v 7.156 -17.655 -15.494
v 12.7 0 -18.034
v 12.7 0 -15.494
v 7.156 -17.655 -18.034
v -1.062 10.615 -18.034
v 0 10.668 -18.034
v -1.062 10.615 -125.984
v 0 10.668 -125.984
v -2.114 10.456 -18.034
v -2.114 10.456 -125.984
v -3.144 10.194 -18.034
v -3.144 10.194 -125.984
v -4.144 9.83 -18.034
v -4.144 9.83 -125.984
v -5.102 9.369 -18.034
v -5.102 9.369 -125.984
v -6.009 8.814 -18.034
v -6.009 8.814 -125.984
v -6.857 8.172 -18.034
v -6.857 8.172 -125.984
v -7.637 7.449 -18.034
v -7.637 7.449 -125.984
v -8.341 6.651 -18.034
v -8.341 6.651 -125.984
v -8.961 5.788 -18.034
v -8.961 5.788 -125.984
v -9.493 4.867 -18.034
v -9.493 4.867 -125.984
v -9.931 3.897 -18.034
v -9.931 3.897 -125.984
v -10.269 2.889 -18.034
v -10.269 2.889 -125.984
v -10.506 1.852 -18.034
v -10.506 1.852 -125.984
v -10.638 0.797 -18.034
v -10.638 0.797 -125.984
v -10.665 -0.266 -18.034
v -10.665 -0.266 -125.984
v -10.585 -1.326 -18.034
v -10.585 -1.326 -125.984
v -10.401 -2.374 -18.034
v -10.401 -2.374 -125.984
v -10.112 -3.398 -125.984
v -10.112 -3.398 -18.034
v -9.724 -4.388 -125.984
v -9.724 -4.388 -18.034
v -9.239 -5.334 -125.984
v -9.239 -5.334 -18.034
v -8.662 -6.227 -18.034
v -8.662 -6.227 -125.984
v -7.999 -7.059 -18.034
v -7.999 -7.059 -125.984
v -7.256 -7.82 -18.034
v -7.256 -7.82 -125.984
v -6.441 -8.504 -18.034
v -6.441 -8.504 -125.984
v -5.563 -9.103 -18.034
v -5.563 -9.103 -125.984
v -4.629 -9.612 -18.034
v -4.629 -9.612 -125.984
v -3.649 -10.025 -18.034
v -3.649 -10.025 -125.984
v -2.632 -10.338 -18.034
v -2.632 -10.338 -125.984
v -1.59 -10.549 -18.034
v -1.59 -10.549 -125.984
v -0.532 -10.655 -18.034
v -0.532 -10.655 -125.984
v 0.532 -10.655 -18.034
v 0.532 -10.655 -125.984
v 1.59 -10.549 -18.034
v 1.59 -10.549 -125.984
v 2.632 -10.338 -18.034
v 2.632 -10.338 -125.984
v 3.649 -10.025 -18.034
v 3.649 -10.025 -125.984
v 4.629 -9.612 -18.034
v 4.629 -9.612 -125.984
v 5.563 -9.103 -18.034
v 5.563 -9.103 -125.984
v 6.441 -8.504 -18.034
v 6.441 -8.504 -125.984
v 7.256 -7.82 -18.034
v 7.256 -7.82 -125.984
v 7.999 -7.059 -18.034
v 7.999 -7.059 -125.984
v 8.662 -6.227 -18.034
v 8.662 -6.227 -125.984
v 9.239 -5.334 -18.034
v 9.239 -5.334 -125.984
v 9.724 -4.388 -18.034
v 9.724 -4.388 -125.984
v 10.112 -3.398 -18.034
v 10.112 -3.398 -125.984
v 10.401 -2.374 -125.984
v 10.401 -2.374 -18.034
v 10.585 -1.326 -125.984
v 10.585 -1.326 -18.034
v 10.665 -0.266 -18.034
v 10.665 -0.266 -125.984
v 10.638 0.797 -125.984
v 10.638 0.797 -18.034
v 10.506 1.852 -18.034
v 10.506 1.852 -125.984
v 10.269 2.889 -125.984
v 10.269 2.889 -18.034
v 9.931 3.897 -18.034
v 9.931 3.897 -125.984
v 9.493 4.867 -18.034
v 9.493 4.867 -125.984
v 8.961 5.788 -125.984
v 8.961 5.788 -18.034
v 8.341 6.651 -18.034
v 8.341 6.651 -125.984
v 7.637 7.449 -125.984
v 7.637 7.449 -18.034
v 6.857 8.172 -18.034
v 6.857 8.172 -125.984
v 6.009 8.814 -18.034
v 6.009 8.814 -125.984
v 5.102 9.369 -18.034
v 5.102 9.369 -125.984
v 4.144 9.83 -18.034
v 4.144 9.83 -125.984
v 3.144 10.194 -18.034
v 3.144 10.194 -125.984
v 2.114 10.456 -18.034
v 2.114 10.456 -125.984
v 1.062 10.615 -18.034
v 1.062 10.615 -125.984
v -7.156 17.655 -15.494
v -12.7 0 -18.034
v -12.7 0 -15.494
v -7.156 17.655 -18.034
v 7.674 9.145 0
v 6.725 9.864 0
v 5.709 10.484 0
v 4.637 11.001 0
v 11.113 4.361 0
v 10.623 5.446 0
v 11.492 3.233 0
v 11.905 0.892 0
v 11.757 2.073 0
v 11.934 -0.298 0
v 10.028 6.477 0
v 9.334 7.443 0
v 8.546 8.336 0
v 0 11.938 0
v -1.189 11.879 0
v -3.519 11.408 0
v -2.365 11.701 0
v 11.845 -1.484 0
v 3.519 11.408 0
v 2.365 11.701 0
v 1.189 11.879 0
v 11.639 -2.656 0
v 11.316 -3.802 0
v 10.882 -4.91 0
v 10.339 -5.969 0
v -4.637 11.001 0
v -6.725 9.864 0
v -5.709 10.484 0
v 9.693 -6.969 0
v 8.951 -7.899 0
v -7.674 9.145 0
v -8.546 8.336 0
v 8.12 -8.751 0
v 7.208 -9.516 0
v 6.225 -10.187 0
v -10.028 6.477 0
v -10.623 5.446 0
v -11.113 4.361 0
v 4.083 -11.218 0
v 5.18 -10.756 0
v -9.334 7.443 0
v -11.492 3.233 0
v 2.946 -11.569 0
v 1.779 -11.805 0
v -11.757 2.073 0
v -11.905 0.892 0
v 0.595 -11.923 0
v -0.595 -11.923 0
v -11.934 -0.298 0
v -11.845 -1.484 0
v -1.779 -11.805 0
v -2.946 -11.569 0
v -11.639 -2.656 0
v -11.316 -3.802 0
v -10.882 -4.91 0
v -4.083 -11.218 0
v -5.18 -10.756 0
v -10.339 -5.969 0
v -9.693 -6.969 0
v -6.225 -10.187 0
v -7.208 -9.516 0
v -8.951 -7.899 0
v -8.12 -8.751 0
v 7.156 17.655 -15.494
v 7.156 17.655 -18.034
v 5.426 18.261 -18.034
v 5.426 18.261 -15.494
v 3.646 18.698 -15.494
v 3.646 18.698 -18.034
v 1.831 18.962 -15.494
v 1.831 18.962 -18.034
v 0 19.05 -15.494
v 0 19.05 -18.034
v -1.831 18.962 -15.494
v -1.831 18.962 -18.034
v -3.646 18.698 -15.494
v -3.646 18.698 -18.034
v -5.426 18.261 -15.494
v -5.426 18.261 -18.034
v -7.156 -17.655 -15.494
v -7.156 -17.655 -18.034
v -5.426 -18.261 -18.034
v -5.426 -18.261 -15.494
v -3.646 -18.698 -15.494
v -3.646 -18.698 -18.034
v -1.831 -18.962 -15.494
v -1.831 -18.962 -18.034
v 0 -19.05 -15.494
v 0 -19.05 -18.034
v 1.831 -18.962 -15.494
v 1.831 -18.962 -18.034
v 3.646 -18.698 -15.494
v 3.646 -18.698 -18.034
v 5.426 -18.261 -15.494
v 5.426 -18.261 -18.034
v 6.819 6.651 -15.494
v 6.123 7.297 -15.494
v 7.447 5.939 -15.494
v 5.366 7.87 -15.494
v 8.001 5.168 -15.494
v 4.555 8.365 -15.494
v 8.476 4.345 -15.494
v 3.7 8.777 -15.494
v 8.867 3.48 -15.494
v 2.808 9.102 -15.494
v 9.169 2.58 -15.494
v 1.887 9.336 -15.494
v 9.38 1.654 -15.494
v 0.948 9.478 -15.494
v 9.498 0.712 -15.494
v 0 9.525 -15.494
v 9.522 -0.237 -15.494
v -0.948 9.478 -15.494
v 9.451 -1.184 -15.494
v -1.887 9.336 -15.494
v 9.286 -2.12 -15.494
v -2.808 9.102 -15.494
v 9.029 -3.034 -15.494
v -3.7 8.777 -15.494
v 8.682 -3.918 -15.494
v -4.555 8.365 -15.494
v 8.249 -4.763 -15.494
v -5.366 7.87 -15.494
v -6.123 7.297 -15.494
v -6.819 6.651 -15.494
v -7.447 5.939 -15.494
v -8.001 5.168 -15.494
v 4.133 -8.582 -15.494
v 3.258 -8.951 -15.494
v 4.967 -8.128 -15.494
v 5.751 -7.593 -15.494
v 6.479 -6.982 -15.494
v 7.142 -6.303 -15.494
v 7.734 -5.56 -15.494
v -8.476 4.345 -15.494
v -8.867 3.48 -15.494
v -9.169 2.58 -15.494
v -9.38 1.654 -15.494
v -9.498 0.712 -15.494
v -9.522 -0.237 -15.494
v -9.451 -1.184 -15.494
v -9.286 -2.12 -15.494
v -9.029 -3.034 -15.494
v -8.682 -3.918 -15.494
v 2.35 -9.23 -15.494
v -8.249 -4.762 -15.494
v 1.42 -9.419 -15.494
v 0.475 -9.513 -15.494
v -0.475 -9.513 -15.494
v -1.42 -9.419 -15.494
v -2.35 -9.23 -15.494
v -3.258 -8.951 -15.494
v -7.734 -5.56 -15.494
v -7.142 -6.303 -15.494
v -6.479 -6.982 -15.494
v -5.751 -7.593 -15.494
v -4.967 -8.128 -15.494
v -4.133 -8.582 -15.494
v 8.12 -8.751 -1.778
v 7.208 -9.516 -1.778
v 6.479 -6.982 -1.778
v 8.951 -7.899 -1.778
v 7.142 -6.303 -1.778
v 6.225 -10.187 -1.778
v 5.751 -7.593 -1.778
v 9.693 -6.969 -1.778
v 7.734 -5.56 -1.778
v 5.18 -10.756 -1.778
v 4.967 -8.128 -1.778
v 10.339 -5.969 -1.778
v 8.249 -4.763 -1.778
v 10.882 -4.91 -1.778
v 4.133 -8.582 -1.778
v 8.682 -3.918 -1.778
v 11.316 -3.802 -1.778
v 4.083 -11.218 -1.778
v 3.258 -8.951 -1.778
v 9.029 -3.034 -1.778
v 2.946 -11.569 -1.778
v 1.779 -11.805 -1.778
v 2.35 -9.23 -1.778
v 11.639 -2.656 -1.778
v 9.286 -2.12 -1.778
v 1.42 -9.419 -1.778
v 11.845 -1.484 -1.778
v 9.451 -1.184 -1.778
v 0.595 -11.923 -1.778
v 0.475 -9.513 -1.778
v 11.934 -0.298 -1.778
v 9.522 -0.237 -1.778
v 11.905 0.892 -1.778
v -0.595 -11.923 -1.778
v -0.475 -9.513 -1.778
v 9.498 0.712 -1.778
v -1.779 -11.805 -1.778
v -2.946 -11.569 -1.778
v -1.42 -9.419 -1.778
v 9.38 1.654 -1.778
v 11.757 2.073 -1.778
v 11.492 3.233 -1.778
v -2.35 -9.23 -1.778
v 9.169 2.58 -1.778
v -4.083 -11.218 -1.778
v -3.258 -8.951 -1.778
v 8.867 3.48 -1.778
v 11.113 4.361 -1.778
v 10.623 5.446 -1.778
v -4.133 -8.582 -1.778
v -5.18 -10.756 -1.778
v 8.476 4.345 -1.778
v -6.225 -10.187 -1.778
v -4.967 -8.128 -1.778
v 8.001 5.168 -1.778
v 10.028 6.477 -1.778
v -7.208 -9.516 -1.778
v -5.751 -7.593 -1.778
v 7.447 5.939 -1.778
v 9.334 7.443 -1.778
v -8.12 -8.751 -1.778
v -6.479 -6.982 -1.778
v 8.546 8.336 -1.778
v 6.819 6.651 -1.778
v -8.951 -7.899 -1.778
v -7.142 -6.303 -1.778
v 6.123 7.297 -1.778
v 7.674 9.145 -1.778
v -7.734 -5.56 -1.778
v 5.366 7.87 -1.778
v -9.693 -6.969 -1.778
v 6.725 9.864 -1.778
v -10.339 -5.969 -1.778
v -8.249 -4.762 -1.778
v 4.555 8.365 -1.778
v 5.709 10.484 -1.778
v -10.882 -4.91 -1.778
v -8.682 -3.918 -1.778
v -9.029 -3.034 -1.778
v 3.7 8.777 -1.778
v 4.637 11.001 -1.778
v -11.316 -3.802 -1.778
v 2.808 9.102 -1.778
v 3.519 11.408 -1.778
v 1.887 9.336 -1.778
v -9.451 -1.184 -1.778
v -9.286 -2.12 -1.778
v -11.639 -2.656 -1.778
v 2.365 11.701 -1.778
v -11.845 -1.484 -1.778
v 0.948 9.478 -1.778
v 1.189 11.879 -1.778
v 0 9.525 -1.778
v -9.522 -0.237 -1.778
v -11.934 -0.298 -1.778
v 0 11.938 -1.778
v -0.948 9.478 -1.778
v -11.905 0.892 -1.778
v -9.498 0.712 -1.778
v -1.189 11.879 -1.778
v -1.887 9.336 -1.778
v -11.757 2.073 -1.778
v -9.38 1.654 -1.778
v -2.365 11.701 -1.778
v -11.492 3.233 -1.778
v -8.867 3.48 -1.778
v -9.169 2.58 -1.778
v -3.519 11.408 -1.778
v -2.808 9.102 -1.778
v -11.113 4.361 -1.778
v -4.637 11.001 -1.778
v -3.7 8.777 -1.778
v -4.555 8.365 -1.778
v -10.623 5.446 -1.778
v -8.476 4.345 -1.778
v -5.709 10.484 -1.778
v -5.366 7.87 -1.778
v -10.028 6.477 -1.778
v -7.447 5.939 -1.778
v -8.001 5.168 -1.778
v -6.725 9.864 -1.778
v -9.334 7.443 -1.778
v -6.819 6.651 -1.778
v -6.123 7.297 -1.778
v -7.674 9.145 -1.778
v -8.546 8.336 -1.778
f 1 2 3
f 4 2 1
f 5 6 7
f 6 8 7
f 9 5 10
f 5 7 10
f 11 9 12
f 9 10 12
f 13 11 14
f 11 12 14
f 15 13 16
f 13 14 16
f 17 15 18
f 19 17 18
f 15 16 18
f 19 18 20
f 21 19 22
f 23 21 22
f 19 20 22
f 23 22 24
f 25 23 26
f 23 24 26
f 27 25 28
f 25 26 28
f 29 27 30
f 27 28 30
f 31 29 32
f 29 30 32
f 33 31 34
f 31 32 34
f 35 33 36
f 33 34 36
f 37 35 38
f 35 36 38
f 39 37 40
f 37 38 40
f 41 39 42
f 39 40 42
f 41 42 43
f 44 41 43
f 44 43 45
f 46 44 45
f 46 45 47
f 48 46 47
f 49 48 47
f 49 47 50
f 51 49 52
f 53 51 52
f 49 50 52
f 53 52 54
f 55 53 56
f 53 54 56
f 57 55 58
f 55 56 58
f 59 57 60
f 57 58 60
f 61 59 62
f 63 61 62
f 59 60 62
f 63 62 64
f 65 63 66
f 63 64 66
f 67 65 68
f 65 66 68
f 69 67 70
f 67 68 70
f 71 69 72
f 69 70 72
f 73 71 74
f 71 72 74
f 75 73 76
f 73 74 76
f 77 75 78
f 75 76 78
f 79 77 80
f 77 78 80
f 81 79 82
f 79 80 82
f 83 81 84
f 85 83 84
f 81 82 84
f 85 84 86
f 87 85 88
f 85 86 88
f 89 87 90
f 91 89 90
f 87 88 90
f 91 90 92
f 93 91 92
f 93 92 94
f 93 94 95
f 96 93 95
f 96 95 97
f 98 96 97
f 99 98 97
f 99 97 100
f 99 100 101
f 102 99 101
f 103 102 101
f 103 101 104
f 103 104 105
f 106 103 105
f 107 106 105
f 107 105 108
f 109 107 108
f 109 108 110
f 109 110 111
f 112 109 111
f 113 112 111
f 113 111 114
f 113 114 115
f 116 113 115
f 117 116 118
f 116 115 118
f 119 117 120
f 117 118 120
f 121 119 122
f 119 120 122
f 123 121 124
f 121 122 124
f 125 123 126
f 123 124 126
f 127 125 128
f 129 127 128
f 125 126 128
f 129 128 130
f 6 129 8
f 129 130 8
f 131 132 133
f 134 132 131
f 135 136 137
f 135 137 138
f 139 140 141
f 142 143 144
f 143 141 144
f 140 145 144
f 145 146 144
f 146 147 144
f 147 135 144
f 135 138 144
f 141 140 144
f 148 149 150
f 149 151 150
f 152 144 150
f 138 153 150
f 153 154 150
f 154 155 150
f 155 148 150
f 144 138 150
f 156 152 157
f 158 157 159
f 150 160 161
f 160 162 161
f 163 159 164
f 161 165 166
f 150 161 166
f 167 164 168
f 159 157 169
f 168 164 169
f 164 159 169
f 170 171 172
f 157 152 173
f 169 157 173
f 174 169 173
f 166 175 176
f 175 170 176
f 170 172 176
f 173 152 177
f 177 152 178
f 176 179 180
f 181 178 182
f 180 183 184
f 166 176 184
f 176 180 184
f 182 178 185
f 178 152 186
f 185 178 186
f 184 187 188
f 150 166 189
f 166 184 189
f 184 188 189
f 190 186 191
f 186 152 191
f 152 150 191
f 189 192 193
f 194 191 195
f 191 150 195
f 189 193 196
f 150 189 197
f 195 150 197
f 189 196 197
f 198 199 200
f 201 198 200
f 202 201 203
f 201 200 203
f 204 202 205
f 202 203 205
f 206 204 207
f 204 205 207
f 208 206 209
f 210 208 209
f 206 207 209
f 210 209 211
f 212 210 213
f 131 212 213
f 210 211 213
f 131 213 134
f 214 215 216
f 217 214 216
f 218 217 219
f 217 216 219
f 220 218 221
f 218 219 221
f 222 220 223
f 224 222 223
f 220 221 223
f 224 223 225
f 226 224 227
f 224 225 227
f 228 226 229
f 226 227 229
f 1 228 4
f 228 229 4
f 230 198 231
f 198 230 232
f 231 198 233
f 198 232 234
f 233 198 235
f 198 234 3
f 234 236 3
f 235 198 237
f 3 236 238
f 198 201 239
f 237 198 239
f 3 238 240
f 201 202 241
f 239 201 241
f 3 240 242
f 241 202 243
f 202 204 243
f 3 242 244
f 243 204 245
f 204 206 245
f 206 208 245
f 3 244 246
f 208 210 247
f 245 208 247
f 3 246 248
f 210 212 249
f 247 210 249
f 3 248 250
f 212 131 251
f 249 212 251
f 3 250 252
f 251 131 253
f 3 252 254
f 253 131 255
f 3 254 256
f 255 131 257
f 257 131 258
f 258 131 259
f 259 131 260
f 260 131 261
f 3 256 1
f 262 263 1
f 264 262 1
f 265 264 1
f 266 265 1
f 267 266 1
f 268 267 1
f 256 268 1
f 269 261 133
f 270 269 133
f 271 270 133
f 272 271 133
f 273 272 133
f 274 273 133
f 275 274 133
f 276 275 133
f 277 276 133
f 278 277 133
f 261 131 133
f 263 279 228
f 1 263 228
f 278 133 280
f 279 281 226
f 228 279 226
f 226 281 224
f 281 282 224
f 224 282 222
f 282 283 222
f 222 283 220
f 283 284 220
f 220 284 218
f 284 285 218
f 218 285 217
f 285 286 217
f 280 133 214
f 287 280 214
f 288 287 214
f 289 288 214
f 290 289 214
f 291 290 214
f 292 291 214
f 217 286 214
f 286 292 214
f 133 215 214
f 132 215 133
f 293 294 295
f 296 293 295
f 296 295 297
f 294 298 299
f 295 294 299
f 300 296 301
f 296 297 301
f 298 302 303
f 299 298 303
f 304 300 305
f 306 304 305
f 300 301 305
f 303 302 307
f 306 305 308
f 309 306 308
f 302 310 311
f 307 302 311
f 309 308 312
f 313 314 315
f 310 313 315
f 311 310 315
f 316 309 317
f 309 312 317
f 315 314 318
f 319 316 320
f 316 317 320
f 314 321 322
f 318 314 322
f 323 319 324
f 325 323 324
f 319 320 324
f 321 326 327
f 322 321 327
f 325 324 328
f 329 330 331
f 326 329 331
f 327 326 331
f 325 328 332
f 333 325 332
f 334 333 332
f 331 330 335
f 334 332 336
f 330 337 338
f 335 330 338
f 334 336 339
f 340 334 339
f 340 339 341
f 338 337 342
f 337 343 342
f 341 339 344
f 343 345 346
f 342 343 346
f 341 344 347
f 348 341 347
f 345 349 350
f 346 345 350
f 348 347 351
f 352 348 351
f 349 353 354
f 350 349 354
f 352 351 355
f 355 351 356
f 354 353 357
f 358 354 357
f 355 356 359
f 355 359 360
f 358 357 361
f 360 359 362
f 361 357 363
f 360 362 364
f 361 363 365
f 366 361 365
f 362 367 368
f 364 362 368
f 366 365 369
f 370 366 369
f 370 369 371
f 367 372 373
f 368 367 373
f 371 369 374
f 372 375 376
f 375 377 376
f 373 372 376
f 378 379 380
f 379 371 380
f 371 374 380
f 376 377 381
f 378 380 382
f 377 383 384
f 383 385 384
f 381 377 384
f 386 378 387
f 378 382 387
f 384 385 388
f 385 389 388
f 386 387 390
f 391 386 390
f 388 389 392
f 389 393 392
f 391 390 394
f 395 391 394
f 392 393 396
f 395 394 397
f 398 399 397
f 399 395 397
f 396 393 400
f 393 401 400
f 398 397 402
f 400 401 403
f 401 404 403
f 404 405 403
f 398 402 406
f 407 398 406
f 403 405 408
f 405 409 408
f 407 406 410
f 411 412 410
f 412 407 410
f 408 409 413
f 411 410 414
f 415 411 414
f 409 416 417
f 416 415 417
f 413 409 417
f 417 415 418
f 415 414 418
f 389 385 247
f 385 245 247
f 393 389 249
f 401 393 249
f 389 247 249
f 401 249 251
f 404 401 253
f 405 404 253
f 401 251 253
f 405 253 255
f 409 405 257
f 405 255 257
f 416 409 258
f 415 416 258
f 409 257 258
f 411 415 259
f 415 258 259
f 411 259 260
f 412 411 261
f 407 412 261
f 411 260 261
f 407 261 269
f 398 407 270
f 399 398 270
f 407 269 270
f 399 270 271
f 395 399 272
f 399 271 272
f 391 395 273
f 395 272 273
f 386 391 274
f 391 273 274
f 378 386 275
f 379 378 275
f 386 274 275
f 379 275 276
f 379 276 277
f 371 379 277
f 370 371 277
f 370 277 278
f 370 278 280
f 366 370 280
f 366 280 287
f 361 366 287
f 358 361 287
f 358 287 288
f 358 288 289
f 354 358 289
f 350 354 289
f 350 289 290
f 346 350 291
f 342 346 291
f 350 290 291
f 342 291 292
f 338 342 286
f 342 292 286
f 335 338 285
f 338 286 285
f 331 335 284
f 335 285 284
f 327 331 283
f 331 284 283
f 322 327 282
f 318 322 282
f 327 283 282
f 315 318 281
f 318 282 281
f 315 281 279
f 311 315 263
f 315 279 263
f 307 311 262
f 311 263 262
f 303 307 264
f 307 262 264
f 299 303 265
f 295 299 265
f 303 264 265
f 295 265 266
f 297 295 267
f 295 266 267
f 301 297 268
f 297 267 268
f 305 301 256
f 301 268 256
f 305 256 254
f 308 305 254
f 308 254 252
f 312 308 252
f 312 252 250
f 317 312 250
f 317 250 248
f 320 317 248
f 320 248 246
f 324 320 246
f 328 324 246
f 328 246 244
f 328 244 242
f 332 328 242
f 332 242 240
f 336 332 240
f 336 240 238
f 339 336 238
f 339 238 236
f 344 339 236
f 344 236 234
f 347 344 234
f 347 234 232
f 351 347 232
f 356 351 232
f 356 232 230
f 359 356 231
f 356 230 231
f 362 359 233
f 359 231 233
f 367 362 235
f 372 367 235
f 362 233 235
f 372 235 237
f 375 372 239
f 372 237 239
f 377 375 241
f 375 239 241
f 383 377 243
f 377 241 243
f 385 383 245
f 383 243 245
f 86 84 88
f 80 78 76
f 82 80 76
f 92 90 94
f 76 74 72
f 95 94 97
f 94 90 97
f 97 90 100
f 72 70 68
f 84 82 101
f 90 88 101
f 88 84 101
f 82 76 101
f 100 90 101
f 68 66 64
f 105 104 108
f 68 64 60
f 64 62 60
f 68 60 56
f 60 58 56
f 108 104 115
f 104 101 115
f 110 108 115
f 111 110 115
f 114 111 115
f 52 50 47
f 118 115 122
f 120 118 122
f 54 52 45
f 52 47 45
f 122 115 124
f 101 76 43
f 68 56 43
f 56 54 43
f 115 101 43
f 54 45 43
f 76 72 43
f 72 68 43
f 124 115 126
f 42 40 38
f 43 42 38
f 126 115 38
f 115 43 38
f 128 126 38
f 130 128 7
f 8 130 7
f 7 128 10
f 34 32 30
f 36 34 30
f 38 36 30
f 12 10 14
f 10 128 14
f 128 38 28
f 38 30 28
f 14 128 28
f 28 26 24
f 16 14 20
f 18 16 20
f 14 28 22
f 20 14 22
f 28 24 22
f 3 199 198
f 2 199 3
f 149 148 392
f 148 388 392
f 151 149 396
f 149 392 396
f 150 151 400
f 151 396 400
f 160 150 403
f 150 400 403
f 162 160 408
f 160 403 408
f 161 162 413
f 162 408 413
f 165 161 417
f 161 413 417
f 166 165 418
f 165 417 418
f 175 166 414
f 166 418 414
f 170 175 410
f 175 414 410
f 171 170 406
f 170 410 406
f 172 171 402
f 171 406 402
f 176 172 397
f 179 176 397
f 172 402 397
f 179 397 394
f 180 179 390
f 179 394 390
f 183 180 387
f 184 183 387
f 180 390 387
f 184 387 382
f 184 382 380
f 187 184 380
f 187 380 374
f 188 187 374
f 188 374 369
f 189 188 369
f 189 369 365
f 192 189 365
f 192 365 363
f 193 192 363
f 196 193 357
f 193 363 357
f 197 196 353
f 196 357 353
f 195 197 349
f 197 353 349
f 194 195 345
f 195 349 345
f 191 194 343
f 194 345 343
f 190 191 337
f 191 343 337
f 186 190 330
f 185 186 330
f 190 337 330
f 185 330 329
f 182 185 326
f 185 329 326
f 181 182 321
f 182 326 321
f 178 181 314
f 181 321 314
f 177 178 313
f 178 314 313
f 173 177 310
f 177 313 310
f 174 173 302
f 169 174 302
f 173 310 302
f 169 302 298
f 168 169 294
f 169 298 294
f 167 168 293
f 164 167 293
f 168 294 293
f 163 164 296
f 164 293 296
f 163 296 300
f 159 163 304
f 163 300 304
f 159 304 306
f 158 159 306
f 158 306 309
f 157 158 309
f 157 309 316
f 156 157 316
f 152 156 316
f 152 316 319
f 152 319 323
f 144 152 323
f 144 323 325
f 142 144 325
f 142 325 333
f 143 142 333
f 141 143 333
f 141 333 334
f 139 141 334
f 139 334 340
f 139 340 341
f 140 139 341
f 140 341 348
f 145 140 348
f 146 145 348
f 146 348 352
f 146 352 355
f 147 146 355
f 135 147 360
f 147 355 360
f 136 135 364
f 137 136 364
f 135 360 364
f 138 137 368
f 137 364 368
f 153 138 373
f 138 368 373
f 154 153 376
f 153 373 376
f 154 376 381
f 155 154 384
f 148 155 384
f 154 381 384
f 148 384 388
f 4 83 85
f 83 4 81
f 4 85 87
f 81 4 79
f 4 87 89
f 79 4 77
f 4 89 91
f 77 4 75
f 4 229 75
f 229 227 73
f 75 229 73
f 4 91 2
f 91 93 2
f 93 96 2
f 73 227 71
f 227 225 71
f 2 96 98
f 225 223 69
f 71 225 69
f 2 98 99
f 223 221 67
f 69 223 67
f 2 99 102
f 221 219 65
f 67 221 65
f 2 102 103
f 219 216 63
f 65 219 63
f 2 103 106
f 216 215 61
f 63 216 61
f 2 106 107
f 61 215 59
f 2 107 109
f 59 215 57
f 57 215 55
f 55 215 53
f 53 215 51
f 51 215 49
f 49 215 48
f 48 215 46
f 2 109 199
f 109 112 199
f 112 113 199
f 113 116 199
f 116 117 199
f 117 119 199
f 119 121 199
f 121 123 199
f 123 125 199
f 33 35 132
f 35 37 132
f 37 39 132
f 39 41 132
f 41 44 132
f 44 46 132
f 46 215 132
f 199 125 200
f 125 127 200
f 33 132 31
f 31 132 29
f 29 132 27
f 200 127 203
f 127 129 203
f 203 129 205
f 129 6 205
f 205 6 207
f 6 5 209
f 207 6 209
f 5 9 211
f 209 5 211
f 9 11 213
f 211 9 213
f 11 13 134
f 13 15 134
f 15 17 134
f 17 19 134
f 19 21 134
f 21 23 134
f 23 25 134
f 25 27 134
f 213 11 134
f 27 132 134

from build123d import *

# Parameters (mm, degrees)
CORTAR_EXTRUIR1_START = -2.54
CORTAR_EXTRUIR1_DEPTH = 2.54


# Read off the part's stored shape, not the designer's step: Cortar-Extruir1
with BuildPart() as part:
    # Croquis1 → Revolución1 (revolve)
    with BuildSketch(Plane(origin=(0, 0, 0), x_dir=(0, 0, -1), z_dir=(1, 0, 0))):
        Polygon((0, 0), (0, 11.938), (1.778, 11.938), (1.778, 9.525), (15.494, 9.525), (15.494, 19.05), (18.034, 19.05), (18.034, 10.668), (125.984, 10.668), (125.984, 0), align=None)
    revolve(axis=Axis((0, 0, -125.984), (0, 0, 1)))

    # Cortar-Extruir1 outline → Cortar-Extruir1 (cut)
    with BuildSketch(Plane.XY.offset(-15.494).offset(CORTAR_EXTRUIR1_START)):
        with BuildLine():
            Line((-7.156259894, -17.654756989), (-12.7, 0))
            Line((-12.7, 0), (-7.156259894, 17.654756989))
            ThreePointArc((-7.156259894, 17.654756989), (-19.05, 0), (-7.156259894, -17.654756989))
        make_face()
        with BuildLine():
            Line((12.7, 0), (7.156259894, -17.654756989))
            ThreePointArc((7.156259894, -17.654756989), (19.05, 0), (7.156259894, 17.654756989))
            Line((7.156259894, 17.654756989), (12.7, 0))
        make_face()
    extrude(amount=CORTAR_EXTRUIR1_DEPTH, mode=Mode.SUBTRACT)


solid = part.part
